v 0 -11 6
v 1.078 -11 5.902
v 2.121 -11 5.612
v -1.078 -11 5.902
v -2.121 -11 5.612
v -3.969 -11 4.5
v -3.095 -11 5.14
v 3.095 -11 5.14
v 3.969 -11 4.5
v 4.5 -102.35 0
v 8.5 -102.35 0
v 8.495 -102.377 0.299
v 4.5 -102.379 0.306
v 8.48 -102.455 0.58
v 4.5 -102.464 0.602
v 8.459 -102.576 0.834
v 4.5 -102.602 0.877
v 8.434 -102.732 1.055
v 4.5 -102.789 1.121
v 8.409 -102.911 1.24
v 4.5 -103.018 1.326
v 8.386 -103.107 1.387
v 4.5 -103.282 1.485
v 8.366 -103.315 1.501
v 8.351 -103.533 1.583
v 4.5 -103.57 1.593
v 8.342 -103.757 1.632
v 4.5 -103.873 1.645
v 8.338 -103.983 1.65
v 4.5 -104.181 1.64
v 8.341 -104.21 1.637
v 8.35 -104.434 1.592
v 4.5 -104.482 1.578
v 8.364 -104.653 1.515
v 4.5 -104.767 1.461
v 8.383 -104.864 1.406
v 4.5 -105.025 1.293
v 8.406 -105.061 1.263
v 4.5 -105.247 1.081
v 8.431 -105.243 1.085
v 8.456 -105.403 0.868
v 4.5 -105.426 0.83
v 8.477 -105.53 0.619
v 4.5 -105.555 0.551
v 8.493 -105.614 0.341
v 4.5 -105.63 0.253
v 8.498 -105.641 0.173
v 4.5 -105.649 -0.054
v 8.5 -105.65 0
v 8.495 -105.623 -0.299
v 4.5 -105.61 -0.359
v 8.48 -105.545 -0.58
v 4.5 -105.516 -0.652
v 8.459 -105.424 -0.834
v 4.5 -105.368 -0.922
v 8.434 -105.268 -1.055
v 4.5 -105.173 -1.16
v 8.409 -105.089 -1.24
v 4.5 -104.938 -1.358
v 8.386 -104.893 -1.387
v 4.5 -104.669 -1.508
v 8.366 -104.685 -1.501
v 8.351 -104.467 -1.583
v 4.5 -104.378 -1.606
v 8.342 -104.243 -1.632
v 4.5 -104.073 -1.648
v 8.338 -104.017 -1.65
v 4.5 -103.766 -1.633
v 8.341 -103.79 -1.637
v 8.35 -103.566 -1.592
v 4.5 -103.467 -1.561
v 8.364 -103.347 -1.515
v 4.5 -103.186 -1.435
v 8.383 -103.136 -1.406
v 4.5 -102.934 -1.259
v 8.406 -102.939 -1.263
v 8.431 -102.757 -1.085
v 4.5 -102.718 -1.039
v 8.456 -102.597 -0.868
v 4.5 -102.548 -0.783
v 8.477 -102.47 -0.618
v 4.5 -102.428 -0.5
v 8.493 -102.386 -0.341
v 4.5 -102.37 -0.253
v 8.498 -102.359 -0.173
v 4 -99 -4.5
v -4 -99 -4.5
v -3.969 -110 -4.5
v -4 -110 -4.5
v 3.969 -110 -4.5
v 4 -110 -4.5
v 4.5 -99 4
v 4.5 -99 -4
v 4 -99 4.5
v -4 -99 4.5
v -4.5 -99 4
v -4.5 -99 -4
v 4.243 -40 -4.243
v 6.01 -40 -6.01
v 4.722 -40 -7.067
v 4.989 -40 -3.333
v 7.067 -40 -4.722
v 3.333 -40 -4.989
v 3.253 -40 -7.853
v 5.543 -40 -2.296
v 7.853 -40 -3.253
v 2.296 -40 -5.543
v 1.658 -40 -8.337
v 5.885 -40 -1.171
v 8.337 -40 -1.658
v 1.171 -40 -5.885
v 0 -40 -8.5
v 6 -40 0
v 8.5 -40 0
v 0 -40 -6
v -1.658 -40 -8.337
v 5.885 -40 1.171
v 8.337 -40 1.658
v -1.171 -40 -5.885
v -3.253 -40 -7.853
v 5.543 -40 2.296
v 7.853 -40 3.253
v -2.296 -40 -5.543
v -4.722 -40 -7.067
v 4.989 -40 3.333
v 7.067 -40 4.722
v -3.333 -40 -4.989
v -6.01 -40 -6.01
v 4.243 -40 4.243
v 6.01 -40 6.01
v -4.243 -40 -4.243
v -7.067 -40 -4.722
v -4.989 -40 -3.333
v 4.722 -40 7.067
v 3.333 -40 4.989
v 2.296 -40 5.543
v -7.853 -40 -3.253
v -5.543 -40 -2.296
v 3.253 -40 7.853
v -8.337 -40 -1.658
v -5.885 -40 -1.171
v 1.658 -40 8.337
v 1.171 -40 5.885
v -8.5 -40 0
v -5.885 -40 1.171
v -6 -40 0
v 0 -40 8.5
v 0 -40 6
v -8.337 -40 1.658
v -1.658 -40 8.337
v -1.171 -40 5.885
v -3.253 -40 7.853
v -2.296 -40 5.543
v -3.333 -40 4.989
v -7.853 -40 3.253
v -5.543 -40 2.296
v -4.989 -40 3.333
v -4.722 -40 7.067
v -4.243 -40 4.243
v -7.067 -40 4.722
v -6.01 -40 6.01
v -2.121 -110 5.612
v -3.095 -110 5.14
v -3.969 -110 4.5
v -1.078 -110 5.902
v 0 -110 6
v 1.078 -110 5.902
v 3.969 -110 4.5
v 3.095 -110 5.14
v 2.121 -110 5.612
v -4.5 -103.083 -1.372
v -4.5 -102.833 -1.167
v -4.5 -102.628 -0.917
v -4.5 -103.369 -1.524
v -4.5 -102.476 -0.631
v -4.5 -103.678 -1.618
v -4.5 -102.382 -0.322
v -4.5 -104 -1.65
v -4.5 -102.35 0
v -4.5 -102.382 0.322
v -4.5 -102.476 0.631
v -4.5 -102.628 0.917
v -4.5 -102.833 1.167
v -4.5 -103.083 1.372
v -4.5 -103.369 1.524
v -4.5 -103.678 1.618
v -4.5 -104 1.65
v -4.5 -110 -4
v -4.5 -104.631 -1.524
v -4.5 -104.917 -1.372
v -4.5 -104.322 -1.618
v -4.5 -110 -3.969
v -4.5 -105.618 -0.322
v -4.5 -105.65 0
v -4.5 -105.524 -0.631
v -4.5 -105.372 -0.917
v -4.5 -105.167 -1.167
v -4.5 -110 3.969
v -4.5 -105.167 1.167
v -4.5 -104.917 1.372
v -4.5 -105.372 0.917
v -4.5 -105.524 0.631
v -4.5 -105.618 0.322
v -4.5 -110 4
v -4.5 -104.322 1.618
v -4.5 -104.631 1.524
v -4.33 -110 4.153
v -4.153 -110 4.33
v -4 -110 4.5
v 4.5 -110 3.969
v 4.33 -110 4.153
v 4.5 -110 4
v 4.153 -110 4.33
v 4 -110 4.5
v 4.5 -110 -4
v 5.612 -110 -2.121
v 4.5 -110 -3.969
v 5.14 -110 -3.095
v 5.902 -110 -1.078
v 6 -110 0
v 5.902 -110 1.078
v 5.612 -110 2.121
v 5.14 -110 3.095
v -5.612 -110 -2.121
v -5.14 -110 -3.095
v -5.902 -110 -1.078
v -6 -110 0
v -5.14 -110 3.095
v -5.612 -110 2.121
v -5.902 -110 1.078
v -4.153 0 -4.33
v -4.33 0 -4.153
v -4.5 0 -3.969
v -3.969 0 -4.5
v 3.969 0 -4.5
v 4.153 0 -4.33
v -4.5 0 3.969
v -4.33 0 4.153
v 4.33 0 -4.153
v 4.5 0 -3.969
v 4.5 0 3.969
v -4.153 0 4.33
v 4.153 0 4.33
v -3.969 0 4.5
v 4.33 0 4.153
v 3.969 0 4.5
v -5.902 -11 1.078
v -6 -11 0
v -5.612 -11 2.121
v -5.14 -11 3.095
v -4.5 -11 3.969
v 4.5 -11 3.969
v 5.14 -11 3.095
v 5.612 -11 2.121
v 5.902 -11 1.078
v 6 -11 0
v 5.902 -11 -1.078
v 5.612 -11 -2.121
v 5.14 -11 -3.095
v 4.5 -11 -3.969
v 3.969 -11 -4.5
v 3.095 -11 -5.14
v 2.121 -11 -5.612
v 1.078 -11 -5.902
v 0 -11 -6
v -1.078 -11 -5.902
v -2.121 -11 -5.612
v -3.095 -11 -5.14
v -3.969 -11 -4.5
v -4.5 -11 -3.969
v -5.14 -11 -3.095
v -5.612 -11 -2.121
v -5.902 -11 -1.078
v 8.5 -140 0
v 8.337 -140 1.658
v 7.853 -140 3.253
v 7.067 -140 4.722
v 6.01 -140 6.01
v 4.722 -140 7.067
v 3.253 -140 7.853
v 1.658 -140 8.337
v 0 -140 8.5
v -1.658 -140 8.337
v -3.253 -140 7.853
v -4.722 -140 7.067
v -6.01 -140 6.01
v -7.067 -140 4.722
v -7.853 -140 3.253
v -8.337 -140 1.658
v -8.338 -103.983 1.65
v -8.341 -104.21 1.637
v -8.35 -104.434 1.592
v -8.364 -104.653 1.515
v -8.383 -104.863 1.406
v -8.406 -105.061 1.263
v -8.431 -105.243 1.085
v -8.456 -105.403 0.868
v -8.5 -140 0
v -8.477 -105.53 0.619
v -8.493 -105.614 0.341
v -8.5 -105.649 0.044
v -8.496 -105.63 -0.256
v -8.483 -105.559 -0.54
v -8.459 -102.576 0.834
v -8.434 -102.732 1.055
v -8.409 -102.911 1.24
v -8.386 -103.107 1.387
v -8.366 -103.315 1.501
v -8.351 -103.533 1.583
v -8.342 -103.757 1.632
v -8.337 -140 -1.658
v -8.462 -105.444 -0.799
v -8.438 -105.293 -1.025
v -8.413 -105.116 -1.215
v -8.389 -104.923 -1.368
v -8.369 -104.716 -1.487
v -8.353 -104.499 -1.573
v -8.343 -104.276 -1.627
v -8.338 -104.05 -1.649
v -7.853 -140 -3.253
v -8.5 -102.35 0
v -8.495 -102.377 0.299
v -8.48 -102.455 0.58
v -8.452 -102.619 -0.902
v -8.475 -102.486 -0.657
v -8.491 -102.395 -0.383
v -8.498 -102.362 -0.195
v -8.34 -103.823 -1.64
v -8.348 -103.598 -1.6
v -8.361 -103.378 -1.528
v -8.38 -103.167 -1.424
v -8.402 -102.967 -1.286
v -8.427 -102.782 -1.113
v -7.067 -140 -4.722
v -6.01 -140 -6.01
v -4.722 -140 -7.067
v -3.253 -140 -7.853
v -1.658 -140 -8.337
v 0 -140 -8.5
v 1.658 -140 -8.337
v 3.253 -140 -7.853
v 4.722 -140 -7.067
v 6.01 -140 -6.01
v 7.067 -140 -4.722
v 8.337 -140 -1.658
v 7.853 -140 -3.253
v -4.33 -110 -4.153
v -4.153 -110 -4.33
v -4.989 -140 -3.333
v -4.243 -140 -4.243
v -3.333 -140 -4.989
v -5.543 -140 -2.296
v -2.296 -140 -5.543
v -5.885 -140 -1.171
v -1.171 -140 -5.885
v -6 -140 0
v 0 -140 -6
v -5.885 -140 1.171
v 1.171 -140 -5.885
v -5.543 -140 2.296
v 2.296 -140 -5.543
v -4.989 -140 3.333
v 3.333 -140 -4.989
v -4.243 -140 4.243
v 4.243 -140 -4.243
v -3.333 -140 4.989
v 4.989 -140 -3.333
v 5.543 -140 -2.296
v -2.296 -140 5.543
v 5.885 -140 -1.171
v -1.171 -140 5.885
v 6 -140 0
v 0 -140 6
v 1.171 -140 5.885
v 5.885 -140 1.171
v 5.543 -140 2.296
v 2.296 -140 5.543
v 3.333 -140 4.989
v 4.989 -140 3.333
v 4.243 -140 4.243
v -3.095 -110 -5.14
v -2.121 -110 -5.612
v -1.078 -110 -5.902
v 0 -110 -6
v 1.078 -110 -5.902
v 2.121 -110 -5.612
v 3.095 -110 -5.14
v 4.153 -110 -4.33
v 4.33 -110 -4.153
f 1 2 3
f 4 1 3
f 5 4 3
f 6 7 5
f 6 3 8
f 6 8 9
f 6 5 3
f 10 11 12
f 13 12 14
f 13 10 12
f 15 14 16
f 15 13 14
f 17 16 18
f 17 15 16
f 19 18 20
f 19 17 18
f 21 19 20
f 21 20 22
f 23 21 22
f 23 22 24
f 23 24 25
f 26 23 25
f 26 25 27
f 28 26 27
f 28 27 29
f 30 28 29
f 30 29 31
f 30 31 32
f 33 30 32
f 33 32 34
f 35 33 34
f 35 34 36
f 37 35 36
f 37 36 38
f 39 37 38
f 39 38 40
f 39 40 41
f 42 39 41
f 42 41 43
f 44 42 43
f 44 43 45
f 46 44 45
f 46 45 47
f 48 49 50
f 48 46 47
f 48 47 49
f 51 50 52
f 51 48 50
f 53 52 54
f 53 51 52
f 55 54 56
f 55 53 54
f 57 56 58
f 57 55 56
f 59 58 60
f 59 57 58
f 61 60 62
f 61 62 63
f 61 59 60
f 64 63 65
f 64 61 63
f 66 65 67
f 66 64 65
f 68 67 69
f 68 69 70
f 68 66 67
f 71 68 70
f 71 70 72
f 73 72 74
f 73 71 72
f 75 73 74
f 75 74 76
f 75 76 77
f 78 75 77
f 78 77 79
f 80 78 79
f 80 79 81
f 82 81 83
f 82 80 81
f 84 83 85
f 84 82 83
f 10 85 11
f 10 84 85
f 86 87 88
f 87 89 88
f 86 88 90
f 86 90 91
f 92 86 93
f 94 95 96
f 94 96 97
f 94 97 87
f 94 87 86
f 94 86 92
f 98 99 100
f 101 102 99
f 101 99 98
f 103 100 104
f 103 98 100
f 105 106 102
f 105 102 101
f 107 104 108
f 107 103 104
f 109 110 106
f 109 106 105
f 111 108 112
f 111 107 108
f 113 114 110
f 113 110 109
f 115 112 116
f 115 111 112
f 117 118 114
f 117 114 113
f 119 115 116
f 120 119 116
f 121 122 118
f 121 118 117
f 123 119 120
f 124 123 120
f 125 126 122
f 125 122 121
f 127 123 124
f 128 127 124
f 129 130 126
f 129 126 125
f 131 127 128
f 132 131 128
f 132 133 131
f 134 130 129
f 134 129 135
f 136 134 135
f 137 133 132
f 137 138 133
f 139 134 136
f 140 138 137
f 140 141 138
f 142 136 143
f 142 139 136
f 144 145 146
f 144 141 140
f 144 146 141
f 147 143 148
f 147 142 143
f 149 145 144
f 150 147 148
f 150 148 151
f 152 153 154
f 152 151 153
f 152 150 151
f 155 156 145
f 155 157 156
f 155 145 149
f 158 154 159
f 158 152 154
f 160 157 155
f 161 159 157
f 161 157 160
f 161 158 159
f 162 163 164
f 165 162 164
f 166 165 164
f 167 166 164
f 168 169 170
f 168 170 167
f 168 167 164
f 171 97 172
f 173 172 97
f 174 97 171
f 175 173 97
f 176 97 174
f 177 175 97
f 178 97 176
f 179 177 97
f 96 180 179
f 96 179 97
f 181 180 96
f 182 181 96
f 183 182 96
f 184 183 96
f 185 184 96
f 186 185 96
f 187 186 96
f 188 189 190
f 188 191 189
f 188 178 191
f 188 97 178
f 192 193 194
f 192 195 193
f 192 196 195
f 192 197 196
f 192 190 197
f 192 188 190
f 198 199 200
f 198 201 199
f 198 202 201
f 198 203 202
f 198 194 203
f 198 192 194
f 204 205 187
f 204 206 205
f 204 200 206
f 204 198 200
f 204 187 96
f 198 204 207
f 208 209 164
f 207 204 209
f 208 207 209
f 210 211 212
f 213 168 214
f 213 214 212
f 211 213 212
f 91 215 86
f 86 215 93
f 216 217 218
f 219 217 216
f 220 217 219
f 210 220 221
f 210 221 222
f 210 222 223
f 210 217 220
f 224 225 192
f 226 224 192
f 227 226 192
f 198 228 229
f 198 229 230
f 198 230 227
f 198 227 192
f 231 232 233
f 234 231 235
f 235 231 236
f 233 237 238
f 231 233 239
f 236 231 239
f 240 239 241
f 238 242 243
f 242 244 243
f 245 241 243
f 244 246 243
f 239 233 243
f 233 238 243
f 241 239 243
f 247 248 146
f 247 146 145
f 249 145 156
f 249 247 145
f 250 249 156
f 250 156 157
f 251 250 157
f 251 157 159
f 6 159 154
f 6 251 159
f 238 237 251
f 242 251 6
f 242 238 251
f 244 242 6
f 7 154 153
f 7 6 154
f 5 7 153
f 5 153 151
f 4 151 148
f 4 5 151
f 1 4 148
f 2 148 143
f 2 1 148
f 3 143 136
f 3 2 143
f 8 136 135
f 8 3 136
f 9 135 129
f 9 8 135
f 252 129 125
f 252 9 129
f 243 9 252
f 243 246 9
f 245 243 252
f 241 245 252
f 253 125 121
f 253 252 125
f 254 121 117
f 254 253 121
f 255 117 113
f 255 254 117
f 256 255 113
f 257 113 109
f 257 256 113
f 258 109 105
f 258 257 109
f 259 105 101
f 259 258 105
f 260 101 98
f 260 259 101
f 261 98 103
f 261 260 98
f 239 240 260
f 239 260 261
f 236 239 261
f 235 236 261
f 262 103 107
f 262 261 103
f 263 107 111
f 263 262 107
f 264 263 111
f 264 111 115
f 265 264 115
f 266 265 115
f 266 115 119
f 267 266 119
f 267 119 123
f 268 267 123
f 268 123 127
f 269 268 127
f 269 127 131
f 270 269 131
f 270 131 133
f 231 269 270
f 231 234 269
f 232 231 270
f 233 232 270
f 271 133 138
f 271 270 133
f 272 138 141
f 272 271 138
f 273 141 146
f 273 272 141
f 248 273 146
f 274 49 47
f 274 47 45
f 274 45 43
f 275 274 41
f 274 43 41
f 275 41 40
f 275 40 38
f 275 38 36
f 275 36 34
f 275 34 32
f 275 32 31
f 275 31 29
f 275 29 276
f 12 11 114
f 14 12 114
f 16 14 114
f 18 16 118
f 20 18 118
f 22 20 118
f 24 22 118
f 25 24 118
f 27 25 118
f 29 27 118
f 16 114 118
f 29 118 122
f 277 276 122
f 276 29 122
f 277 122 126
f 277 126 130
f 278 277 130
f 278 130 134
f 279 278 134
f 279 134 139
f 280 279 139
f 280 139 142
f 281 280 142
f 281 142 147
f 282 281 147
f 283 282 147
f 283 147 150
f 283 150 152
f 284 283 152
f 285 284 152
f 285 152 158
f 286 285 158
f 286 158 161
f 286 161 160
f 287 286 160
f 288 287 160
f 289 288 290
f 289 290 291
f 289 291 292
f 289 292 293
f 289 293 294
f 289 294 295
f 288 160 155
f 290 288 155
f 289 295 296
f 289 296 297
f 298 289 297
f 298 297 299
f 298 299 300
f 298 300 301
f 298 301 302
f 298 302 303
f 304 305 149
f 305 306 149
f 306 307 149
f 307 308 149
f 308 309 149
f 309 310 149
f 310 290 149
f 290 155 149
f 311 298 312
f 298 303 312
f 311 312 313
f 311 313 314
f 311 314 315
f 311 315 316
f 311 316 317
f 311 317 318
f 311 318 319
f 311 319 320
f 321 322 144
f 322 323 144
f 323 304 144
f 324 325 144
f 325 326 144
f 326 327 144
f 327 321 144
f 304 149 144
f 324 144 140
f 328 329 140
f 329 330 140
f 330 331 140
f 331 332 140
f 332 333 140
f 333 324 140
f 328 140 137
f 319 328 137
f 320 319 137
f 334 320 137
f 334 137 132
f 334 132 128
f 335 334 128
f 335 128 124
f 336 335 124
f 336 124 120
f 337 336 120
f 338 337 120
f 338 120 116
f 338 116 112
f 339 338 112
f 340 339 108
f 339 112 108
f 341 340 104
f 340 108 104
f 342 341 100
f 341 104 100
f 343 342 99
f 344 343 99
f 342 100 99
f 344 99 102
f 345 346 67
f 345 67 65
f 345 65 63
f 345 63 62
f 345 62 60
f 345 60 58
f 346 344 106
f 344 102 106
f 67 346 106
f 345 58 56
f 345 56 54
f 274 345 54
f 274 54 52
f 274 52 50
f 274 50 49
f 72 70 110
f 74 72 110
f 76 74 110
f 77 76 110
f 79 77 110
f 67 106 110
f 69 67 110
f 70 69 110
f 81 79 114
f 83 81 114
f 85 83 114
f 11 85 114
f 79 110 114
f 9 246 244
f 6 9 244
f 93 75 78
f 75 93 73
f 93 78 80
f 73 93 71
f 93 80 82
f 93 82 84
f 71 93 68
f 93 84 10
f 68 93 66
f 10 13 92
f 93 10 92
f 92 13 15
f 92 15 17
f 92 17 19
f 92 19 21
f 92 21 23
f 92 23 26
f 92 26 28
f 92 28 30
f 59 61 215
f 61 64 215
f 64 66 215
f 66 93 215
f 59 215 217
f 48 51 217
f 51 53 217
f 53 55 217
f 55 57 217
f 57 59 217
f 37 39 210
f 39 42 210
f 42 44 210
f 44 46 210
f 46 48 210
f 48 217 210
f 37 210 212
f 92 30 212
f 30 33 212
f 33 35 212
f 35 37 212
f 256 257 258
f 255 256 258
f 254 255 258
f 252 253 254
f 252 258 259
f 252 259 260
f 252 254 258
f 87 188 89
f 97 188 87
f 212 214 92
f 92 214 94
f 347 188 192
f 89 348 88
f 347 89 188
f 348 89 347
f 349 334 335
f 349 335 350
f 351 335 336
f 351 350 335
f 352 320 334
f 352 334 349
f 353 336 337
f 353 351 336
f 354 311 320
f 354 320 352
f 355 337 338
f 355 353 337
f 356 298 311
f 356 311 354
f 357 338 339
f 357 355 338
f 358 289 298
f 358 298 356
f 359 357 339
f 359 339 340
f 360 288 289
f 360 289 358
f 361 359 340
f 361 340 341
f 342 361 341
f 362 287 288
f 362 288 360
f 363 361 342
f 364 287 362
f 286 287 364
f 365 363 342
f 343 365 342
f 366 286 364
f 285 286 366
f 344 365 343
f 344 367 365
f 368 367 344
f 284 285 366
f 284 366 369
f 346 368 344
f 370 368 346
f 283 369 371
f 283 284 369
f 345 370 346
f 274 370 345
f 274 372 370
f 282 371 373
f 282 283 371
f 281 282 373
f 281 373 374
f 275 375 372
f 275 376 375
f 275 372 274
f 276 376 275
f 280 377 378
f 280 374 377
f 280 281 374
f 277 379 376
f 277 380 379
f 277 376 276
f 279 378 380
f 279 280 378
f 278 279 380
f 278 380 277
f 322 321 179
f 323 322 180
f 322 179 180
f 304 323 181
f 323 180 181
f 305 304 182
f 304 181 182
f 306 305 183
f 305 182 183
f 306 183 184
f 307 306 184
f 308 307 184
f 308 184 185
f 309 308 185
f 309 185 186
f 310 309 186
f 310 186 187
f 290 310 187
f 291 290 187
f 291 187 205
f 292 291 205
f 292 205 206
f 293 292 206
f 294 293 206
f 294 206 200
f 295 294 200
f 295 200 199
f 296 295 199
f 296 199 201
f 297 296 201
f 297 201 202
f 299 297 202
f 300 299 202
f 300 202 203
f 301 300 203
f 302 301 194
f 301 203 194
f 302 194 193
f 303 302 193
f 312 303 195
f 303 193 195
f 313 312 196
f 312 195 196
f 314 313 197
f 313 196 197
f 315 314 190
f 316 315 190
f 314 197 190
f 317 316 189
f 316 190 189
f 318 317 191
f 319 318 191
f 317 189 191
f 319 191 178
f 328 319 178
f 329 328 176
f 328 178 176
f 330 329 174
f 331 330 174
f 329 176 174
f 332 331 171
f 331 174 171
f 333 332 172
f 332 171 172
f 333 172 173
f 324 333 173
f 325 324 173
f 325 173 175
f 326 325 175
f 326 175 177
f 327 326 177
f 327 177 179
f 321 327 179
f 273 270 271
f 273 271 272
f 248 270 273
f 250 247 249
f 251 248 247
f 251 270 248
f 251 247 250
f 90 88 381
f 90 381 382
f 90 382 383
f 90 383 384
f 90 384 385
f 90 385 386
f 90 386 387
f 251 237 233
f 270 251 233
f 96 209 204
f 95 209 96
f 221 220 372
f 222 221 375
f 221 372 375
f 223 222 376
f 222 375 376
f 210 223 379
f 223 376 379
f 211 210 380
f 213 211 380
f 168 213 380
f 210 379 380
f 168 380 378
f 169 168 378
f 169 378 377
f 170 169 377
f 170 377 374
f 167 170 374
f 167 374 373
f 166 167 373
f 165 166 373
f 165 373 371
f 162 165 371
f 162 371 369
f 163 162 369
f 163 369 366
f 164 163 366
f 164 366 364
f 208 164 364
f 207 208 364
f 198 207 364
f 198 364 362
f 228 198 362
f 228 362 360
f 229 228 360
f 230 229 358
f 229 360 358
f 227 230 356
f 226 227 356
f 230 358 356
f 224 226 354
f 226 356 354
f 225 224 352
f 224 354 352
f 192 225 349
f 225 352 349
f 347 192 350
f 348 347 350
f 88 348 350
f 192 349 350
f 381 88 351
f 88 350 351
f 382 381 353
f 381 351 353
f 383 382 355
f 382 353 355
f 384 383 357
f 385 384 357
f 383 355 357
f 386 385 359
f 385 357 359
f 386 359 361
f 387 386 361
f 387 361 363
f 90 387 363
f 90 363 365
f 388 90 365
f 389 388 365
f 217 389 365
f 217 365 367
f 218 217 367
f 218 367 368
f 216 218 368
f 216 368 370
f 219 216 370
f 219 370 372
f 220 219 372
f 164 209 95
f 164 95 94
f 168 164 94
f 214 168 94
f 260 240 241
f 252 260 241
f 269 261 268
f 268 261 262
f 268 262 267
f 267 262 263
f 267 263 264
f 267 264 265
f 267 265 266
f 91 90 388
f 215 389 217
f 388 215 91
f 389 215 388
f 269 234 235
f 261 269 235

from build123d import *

# Parameters (mm, degrees)
F0_R      = 8.5
F1_DEPTH  = 140
F2_R      = 6
F3_DEPTH  = 30
F4_W      = 9
F4_H      = 9
F5_DEPTH  = 11
F6_SIZE   = 0.5
F7_SIZE   = 0.5
F8_SIZE   = 0.5
F9_R      = 1.65
F10_DEPTH = 25
F11_R     = 8.5
F11_R_2   = 6
F12_DEPTH = 40
F14_DEPTH = 11


# Not quite as in the source:
# - a pattern or mirror of a feature is missing from the dataset's text; its kind, count and spacing are read off the source's solid


with BuildPart() as f1:
    # F0 (on Front) → F1 (new body)
    with BuildSketch(Plane.XZ):
        Circle(F0_R)
    extrude(amount=F1_DEPTH)

    # F2 (on face) → F3 (cut)
    with BuildSketch(Plane.XZ.offset(140)):
        Circle(F2_R)
    extrude(amount=-F3_DEPTH, mode=Mode.SUBTRACT)

    # F4 (on face) → F5 (cut)
    with BuildSketch(Plane.XZ.offset(110)):
        Rectangle(F4_W, F4_H)
    extrude(amount=-F5_DEPTH, mode=Mode.SUBTRACT)

    # F6
    f6_edges = [f1.edges().sort_by_distance(p)[0] for p in [
        (-4.5, -104.5, -4.5),
    ]]
    chamfer(f6_edges, length=F6_SIZE)

    # F7
    f7_edges = [f1.edges().sort_by_distance(p)[0] for p in [
        (4.5, -104.5, -4.5),
    ]]
    chamfer(f7_edges, length=F7_SIZE)

    # F8
    f8_edges = [f1.edges().sort_by_distance(p)[0] for p in [
        (4.5, -104.5, 4.5),
        (-4.5, -104.5, 4.5),
    ]]
    chamfer(f8_edges, length=F8_SIZE)

    # F9 (on face) → F10 (cut)
    with BuildSketch(Plane.YZ.offset(-4.5)):
        with Locations((-104, 0)):
            Circle(F9_R)
    f10 = extrude(amount=-F10_DEPTH, mode=Mode.SUBTRACT)

    # F10_copies: F10 across plane
    add(f10.mirror(Plane(origin=(5.8e-05, 0, 0), x_dir=(1e-06, 1, 0), z_dir=(1, -1e-06, 0))), mode=Mode.SUBTRACT)

    # F11 (on face) → F12 (cut)
    with BuildSketch(Plane(origin=(0, 0, 0), x_dir=(-1, 0, 0), z_dir=(0, 1, 0))):
        Circle(F11_R)
        Circle(F11_R_2, mode=Mode.SUBTRACT)
    extrude(amount=-F12_DEPTH, mode=Mode.SUBTRACT)

    # F13 (on face) → F14 (cut)
    with BuildSketch(Plane(origin=(0, 0, 0), x_dir=(-1, 0, 0), z_dir=(0, 1, 0))):
        with BuildLine():
            Line((3.9686269666, -4.5), (-3.9686269666, -4.5))
            ThreePointArc((-3.9686269666, -4.5), (0, -6), (3.9686269666, -4.5))
        make_face()
        with BuildLine():
            ThreePointArc((-4.5, 3.9686269666), (-6, 0), (-4.5, -3.9686269666))
            Line((-4.5, -3.9686269666), (-4.5, 3.9686269666))
        make_face()
        with BuildLine():
            Line((-4.5, 4.5), (-4.5, 3.9686269666))
            ThreePointArc((-4.5, 3.9686269666), (-4.2426406871, 4.2426406871), (-3.9686269666, 4.5))
            Line((-3.9686269666, 4.5), (-4.5, 4.5))
        make_face()
        with BuildLine():
            Line((4.5, 3.9686269666), (4.5, -3.9686269666))
            ThreePointArc((4.5, -3.9686269666), (5.6124860802, -2.1213203436), (6, 0))
            ThreePointArc((6, 0), (5.6124860802, 2.1213203436), (4.5, 3.9686269666))
        make_face()
        with BuildLine():
            ThreePointArc((3.9686269666, 4.5), (0, 6), (-3.9686269666, 4.5))
            Line((-3.9686269666, 4.5), (3.9686269666, 4.5))
        make_face()
        with BuildLine():
            ThreePointArc((3.9686269666, 4.5), (4.2426406871, 4.2426406871), (4.5, 3.9686269666))
            Line((4.5, 3.9686269666), (4.5, 4.5))
            Line((4.5, 4.5), (3.9686269666, 4.5))
        make_face()
    extrude(amount=-F14_DEPTH, mode=Mode.SUBTRACT)


solid = f1.part
